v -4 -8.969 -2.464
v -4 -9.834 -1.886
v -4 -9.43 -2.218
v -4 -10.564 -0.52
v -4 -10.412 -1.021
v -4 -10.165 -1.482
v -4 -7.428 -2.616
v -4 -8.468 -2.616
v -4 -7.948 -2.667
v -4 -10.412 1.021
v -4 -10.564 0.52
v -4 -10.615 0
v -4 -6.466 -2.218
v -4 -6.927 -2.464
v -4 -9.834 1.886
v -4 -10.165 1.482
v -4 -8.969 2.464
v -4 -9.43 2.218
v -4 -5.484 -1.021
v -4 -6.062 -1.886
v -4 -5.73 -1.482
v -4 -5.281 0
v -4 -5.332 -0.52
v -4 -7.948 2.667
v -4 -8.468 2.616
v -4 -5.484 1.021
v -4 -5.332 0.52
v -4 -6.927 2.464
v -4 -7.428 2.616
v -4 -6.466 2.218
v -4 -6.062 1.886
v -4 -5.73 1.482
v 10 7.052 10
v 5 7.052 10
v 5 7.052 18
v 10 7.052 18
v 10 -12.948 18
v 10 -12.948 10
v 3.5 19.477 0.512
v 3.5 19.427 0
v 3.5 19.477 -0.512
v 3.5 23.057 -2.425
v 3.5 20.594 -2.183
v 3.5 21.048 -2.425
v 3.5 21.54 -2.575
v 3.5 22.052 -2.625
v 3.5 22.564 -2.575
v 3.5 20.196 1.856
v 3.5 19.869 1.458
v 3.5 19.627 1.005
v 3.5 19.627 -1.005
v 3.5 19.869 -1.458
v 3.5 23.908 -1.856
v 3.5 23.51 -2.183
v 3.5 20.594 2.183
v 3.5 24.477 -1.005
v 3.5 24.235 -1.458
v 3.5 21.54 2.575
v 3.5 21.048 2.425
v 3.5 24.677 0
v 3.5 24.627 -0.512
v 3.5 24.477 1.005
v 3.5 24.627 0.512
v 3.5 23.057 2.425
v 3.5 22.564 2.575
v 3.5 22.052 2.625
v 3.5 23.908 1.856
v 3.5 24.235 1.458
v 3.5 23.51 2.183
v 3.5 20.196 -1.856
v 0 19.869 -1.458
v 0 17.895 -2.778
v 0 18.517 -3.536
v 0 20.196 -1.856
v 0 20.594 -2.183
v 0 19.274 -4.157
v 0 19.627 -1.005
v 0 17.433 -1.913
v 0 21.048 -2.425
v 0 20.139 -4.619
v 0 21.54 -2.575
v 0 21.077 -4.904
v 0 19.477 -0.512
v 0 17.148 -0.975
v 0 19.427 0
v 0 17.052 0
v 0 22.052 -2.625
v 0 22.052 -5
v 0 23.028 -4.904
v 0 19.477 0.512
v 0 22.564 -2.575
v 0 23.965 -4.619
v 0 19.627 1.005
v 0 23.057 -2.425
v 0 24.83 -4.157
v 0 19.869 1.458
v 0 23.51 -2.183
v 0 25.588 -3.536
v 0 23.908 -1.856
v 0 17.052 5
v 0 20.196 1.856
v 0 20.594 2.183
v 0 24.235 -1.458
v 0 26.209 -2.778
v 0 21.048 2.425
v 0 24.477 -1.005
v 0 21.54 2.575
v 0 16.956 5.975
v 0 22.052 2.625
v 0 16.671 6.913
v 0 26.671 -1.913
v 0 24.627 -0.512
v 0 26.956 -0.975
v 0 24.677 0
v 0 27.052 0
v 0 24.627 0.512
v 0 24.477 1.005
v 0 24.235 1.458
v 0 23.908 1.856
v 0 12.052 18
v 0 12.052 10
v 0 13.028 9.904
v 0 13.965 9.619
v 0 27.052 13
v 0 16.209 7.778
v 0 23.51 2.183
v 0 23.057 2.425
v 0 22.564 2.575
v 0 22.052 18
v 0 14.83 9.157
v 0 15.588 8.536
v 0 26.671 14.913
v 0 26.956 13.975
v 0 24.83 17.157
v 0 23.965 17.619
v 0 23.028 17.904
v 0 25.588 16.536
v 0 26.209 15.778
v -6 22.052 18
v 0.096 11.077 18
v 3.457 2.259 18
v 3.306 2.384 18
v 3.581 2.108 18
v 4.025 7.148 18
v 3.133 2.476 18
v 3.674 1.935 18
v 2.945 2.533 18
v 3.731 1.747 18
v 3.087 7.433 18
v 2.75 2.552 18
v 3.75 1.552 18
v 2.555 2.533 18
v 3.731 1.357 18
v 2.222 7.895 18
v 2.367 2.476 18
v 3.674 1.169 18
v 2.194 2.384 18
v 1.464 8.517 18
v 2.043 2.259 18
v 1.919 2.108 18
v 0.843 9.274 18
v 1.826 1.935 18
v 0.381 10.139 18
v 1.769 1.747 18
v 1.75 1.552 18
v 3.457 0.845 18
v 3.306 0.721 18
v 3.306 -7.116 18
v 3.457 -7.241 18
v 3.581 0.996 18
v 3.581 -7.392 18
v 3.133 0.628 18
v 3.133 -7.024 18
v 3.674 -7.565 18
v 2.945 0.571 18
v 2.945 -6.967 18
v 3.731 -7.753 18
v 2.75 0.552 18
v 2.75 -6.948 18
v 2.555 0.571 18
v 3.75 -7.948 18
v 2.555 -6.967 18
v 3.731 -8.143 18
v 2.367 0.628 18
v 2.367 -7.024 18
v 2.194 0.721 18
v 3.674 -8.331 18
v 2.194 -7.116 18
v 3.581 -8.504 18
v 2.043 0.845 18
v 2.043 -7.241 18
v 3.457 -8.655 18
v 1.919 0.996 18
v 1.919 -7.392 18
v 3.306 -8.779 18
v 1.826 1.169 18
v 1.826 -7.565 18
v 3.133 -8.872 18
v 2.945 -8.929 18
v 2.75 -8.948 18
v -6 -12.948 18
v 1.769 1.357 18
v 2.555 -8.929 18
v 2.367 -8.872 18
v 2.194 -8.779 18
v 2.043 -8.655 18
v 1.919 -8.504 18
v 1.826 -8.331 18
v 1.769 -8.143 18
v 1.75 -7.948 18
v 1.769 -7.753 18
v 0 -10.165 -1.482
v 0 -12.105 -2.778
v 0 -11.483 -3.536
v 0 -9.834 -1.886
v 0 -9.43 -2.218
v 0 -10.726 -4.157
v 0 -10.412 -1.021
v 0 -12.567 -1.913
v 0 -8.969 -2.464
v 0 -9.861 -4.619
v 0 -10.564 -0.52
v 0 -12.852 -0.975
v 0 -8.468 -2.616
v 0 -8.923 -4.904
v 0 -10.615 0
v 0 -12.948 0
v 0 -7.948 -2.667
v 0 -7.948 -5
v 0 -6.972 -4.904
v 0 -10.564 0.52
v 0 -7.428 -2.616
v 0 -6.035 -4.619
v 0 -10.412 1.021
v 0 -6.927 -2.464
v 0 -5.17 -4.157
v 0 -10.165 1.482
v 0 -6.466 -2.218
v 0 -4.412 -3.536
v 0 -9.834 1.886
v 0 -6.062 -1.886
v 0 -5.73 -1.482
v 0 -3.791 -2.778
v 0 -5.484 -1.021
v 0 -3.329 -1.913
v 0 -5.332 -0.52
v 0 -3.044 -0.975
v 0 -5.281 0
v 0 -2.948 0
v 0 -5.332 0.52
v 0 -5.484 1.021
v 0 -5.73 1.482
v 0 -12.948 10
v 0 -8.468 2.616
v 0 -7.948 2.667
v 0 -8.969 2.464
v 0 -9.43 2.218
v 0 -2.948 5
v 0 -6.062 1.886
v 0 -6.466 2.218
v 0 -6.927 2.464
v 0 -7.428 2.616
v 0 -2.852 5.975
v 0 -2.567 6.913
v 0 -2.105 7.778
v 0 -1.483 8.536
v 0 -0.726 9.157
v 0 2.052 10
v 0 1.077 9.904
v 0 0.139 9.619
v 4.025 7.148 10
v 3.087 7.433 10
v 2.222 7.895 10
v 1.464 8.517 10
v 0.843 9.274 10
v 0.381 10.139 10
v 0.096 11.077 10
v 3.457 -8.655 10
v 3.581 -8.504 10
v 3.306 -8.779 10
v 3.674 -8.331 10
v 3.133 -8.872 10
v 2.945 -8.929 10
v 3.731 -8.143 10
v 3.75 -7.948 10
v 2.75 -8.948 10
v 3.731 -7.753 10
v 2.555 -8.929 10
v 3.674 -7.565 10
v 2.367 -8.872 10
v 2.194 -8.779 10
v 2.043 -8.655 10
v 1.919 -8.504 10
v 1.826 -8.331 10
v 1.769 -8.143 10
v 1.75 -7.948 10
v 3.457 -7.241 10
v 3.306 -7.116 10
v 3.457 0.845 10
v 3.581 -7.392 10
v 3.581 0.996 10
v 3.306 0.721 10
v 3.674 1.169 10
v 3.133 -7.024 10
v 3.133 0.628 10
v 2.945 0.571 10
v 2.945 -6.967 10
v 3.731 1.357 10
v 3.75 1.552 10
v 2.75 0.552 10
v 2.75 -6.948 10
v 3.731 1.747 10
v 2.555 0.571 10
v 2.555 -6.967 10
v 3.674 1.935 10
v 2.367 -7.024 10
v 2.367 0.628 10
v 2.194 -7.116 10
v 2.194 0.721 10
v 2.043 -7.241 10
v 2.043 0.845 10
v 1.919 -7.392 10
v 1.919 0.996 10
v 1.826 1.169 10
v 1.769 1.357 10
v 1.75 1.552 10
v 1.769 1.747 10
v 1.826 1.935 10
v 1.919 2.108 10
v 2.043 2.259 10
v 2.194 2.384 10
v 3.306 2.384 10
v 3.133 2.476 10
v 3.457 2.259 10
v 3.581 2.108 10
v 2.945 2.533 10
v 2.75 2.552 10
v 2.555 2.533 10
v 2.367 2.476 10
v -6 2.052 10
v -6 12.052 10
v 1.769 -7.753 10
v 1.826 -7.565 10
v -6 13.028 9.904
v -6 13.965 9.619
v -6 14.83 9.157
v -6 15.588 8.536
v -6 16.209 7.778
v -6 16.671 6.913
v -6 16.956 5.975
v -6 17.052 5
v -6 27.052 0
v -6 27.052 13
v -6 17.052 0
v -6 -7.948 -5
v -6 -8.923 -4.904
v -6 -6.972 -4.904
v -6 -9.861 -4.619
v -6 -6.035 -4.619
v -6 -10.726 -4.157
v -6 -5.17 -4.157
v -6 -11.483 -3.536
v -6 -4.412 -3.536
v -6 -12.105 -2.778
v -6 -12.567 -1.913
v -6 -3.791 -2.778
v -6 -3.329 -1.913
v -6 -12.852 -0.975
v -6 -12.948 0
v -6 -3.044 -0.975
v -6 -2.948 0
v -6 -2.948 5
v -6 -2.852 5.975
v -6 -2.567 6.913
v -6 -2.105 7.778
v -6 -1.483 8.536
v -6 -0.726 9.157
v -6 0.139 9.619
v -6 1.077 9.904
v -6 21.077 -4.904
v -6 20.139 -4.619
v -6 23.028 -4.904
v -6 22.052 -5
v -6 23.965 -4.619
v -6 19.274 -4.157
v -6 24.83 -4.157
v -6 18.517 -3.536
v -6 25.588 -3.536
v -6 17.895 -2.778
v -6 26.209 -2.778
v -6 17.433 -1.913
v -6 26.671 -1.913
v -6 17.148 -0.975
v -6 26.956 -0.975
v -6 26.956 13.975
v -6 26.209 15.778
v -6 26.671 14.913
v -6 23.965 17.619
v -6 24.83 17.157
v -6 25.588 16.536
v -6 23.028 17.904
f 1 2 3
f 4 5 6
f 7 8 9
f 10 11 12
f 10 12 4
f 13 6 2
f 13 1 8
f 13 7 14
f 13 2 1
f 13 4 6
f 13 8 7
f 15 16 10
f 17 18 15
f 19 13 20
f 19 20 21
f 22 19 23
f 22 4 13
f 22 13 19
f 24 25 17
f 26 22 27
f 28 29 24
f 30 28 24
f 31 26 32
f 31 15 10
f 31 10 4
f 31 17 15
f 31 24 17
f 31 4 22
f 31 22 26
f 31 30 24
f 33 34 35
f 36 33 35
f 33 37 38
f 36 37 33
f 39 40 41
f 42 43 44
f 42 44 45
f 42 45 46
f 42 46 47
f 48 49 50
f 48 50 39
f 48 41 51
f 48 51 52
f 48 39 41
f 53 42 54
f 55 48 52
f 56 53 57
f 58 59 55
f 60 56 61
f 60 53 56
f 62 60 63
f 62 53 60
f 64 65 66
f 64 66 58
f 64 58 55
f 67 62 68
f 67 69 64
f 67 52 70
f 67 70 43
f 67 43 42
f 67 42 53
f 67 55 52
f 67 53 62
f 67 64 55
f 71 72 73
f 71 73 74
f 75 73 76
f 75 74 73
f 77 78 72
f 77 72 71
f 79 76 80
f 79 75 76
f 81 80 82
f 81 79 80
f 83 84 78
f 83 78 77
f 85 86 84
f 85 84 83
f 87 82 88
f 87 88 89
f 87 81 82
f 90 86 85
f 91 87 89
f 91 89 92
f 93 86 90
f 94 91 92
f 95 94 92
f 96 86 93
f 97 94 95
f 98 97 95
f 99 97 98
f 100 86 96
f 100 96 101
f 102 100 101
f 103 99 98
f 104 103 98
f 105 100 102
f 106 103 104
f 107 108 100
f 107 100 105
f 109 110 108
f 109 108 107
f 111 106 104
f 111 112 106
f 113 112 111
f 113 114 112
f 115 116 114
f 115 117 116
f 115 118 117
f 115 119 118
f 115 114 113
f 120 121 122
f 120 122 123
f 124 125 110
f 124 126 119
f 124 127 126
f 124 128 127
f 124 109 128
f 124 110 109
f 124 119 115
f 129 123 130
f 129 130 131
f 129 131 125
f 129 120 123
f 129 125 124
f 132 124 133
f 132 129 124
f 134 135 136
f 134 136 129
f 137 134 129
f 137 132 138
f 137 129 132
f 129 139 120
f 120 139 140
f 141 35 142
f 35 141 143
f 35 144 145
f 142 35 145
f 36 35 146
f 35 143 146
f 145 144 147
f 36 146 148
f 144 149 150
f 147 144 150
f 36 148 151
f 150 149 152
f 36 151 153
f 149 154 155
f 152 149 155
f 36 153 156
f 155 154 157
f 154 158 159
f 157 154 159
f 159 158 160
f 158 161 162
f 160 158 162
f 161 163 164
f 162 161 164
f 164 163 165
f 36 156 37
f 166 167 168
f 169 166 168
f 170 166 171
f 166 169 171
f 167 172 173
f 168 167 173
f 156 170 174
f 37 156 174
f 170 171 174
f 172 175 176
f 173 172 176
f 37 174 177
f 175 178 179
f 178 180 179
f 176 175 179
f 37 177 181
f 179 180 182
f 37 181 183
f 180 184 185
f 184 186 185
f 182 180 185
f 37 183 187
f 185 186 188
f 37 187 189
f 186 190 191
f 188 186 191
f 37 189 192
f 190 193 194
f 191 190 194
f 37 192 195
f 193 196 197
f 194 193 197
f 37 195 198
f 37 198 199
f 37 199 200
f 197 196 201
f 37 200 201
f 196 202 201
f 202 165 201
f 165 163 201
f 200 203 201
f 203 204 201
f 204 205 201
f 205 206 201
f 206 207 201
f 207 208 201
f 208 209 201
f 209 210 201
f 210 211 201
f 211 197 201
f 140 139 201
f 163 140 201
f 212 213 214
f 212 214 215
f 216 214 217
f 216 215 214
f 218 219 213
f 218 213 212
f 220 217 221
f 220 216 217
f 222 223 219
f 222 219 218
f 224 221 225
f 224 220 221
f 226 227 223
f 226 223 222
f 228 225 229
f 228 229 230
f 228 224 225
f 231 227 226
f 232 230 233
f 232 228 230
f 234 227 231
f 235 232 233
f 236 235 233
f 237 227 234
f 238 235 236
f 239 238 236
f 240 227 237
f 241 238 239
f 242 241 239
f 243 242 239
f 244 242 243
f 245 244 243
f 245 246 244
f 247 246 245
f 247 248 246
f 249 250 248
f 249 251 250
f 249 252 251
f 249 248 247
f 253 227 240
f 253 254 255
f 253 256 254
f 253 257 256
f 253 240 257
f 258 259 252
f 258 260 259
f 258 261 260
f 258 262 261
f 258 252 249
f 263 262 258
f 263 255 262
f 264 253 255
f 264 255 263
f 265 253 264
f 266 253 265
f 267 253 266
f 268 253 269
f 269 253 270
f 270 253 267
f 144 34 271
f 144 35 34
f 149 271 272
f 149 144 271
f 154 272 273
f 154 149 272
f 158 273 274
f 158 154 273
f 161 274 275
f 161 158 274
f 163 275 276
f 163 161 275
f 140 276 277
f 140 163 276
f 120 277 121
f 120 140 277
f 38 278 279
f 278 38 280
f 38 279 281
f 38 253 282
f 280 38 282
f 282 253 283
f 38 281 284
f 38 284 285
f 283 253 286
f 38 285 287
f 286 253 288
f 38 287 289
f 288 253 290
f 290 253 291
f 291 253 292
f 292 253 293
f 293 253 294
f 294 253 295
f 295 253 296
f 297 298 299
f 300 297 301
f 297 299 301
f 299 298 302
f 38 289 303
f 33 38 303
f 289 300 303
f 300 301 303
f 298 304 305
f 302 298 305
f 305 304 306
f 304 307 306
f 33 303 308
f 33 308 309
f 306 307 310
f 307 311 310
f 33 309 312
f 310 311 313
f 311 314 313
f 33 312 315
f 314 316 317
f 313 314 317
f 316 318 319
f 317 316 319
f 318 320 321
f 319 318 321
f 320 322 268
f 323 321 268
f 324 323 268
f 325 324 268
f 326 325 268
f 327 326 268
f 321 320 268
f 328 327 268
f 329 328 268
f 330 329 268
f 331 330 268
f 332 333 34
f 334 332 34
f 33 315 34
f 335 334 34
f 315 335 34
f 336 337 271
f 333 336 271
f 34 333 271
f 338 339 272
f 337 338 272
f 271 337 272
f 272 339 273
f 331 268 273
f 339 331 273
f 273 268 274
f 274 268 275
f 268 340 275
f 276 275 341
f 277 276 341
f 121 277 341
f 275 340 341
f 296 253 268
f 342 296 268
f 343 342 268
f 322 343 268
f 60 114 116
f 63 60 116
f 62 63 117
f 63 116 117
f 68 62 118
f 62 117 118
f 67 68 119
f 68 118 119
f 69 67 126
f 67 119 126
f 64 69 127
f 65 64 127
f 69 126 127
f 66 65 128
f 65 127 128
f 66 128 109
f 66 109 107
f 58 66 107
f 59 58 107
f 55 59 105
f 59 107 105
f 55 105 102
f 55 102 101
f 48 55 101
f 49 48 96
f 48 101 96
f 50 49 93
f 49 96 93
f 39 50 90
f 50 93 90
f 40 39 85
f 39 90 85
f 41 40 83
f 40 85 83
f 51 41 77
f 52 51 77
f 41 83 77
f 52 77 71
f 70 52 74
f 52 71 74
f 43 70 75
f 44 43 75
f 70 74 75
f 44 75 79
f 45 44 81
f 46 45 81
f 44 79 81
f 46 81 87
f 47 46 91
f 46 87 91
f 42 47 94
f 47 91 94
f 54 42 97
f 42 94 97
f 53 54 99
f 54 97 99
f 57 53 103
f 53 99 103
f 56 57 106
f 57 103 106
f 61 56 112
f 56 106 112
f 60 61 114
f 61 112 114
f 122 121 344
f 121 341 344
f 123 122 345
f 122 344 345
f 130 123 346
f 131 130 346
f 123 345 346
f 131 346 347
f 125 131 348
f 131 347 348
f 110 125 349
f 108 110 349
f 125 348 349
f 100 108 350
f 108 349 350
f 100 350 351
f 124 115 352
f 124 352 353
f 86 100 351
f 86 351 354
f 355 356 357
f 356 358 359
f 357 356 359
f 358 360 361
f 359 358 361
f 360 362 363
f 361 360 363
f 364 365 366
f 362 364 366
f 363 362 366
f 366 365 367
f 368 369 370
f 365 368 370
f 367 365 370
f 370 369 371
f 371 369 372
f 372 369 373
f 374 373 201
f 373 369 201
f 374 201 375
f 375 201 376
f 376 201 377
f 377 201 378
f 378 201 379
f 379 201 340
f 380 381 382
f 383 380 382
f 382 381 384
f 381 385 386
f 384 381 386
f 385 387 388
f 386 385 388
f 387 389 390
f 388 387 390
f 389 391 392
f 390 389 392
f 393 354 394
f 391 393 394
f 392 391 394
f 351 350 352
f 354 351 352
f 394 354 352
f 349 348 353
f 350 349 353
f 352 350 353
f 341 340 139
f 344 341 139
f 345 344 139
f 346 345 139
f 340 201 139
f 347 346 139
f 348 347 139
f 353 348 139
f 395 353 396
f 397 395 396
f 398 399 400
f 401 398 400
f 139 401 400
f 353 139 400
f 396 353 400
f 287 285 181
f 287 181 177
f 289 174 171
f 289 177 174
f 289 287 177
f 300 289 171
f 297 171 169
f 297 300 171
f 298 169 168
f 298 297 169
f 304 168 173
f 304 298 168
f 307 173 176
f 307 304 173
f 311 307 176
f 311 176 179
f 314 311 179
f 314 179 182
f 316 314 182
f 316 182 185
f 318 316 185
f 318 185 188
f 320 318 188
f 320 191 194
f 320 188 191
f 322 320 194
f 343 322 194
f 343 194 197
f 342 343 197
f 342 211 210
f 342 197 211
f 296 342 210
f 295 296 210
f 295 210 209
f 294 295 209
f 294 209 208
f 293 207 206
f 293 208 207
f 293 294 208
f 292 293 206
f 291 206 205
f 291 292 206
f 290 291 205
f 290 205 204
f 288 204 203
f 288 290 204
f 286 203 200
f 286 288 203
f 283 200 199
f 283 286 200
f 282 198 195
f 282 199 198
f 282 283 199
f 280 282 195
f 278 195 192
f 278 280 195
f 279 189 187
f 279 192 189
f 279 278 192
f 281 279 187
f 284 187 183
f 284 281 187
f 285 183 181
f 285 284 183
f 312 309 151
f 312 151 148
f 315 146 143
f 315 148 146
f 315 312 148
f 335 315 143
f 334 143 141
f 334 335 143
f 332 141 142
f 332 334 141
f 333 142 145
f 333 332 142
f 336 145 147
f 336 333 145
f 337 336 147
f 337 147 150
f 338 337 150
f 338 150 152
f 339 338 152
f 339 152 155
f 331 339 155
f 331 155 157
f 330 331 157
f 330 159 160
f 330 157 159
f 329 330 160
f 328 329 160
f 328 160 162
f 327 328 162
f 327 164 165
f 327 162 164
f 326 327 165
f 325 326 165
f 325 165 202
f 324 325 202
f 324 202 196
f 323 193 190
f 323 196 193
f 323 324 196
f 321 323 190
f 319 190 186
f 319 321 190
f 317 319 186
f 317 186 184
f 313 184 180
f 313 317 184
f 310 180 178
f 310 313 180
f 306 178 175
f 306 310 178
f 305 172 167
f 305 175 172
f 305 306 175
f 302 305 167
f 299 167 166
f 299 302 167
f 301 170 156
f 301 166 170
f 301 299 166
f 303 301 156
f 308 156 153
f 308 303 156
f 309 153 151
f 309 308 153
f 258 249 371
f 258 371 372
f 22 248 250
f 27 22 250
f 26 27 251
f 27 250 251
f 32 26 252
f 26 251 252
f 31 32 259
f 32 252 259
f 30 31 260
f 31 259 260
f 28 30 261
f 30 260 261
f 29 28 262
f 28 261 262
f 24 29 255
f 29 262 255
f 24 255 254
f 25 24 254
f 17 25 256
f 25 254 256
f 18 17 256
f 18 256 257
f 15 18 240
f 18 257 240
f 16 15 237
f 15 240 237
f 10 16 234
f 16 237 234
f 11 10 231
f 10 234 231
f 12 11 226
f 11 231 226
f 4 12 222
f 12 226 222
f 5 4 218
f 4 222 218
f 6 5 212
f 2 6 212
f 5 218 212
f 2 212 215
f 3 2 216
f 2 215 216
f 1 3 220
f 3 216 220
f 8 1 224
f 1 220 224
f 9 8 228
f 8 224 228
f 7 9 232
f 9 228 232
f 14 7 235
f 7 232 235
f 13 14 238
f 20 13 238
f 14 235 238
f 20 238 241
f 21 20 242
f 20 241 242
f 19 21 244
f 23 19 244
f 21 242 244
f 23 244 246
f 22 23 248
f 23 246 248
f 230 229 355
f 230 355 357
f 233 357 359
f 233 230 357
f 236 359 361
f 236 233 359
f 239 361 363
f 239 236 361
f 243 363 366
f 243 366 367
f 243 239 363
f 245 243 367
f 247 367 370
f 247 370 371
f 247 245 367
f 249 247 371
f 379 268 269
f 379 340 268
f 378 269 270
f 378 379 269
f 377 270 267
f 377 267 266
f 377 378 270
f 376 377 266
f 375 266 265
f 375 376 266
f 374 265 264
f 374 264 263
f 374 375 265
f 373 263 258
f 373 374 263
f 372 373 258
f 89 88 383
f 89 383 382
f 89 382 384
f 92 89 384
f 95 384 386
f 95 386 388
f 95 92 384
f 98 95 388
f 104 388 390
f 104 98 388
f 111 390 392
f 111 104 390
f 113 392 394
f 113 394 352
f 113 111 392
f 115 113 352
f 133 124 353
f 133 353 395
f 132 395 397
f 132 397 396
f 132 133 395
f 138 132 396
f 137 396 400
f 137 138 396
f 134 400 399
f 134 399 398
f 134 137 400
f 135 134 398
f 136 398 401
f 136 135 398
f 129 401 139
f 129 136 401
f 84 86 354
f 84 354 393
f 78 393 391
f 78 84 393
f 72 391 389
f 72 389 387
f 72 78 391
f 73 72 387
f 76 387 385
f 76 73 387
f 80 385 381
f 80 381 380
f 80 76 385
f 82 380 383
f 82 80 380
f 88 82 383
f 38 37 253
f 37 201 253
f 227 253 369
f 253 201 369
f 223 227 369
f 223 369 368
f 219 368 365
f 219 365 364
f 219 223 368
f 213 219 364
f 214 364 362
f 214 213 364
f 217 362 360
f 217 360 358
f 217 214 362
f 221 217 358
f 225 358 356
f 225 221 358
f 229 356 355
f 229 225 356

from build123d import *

# Parameters (mm, degrees)
F0_R     = 2.667
F0_R_2   = 2.625
F2_DEPTH = 6
F3_DEPTH = 3.5
F4_DEPTH = 4
F5_DEPTH = 10
F1_R     = 1
F6_DEPTH = 18.001
F7_R     = 4.99999


# Not quite as in the source:
# - a fillet or chamfer is up to 0.001 mm smaller than in the source, because OpenCascade refuses the exact size


with BuildPart() as f2:
    # F0 (on Right) → F2 (new body)
    with BuildSketch(Plane.YZ):
        Polygon((7.0520542562, 18), (-12.9479457438, 18), (-12.9479457438, 10), (-2.9479457438, 10), (7.0520542562, 10), align=None)
        with BuildLine():
            Line((22.0520542562, 18), (7.0520542562, 18))
            Line((7.0520542562, 18), (7.0520542562, 10))
            Line((7.0520542562, 10), (17.0520542562, 10))
            Line((17.0520542562, 10), (27.0520542562, 10))
            Line((27.0520542562, 10), (27.0520542562, 13))
            ThreePointArc((27.0520542562, 13), (25.5875881621, 16.5355339059), (22.0520542562, 18))
        make_face()
        with BuildLine():
            Line((-2.9479457438, 10), (-12.9479457438, 10))
            Line((-12.9479457438, 10), (-12.9479457438, 0))
            ThreePointArc((-12.9479457438, 0), (-11.4834796497, -3.5355339059), (-7.9479457438, -5))
            ThreePointArc((-7.9479457438, -5), (-4.4124118379, -3.5355339059), (-2.9479457438, 0))
            Line((-2.9479457438, 0), (-2.9479457438, 10))
        make_face()
        with Locations((-7.9479457438, 0)):
            Circle(F0_R, mode=Mode.SUBTRACT)
        with BuildLine():
            Line((27.0520542562, 10), (17.0520542562, 10))
            Line((17.0520542562, 10), (17.0520542562, 0))
            ThreePointArc((17.0520542562, 0), (18.5165203503, -3.5355339059), (22.0520542562, -5))
            ThreePointArc((22.0520542562, -5), (25.5875881621, -3.5355339059), (27.0520542562, 0))
            Line((27.0520542562, 0), (27.0520542562, 10))
        make_face()
        with Locations((22.0520542562, 0)):
            Circle(F0_R_2, mode=Mode.SUBTRACT)
        with Locations((-7.9479457438, 0)):
            Circle(F0_R)
        with Locations((22.0520542562, 0)):
            Circle(F0_R_2)
    extrude(amount=-F2_DEPTH)

    # F0 (on Right) → F3 (join)
    with BuildSketch(Plane.YZ):
        with Locations((22.0520542562, 0)):
            Circle(F0_R_2)
    extrude(amount=F3_DEPTH)

    # F0 (on Right) → F4 (cut)
    with BuildSketch(Plane.YZ):
        with Locations((-7.9479457438, 0)):
            Circle(F0_R)
    extrude(amount=-F4_DEPTH, mode=Mode.SUBTRACT)

    # F0 (on Right) → F5 (join)
    with BuildSketch(Plane.YZ):
        Polygon((7.0520542562, 18), (-12.9479457438, 18), (-12.9479457438, 10), (-2.9479457438, 10), (7.0520542562, 10), align=None)
    extrude(amount=F5_DEPTH)

    # F1 (on Top) → F6 (cut, through all)
    with BuildSketch(Plane.XY):
        with Locations((2.75, 1.5520542562)):
            Circle(F1_R)
        with Locations((2.75, -7.9479457438)):
            Circle(F1_R)
    extrude(amount=F6_DEPTH, mode=Mode.SUBTRACT)

    # F7 (radius 5 in the source; OpenCascade refuses exactly that, so slightly less here)
    f7_edges = [f2.edges().sort_by_distance(p)[0] for p in [
        (0, 7.052054, 14),
        (-3, -2.947946, 10),
        (-3, 17.052054, 10),
    ]]
    fillet(f7_edges, radius=F7_R)


solid = f2.part
